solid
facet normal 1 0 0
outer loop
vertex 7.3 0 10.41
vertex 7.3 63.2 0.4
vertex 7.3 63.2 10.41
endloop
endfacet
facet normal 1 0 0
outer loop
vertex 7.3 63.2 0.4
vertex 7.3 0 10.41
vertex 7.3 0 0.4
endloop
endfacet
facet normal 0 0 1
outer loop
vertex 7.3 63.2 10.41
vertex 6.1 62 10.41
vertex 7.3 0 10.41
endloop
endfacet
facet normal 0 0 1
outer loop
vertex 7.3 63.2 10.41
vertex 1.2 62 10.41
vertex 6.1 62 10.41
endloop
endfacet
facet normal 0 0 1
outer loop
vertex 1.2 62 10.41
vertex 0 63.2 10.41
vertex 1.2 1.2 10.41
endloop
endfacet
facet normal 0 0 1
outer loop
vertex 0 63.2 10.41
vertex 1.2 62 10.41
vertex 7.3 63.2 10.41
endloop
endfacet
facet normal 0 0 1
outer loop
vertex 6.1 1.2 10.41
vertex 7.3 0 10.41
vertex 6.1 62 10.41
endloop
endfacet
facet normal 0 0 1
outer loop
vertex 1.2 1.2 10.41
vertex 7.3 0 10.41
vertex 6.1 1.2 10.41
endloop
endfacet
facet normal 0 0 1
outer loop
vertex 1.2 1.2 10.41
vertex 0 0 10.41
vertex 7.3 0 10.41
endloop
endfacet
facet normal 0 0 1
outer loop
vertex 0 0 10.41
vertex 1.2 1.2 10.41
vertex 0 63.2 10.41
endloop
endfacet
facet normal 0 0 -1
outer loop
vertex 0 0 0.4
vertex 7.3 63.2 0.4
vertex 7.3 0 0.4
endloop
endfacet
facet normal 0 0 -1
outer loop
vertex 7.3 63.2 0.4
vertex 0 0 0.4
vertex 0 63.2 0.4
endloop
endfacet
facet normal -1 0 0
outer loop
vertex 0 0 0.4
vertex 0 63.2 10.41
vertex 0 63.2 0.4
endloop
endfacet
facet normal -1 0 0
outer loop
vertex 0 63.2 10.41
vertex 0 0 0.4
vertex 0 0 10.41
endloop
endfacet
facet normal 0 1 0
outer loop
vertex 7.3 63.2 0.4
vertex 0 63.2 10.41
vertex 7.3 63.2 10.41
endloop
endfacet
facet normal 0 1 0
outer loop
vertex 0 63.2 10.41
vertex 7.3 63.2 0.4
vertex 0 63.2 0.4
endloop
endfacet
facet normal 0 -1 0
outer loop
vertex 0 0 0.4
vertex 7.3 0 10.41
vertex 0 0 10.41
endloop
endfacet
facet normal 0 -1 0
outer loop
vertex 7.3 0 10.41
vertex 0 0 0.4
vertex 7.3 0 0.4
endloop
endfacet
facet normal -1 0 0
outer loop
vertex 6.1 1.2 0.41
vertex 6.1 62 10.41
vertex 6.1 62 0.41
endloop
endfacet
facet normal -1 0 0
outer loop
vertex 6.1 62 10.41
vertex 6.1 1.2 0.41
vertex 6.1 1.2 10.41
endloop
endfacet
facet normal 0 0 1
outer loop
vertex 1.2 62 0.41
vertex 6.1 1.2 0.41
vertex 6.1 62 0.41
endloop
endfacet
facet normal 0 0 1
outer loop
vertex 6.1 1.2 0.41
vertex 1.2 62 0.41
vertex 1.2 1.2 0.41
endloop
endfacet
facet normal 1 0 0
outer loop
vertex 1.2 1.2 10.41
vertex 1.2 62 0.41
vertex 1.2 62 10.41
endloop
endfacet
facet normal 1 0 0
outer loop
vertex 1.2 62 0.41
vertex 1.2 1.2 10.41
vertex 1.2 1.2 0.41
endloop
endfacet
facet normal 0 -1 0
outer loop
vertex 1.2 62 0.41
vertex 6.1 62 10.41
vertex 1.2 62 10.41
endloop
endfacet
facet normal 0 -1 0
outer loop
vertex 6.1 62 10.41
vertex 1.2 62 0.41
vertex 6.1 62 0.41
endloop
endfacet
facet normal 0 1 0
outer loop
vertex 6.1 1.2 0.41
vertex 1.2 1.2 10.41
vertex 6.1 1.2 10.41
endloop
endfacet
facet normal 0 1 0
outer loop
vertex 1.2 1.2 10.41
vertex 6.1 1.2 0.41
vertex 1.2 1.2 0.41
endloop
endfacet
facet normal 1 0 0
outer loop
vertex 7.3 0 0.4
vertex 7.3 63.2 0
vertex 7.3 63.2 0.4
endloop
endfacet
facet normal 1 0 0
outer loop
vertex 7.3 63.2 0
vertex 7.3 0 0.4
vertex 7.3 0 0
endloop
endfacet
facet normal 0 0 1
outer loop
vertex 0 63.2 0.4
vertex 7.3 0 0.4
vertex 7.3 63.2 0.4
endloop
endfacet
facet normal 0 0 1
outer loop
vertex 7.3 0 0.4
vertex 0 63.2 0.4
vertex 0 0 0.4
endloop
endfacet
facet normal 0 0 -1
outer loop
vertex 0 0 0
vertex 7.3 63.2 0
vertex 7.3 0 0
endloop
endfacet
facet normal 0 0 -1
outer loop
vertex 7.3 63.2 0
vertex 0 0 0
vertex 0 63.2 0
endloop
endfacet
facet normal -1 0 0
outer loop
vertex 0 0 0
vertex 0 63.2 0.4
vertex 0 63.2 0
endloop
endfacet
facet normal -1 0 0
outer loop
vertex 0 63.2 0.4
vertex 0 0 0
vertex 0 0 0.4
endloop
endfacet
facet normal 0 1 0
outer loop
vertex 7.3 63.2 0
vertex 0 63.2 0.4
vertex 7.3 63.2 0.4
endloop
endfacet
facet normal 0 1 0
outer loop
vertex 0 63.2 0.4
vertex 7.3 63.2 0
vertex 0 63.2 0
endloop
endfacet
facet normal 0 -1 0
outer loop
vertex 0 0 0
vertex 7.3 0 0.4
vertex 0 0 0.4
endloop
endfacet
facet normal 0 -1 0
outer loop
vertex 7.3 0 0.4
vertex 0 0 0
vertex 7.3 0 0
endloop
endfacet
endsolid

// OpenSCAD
// file: ../../Base/Rotation.scad
// Fischertechnik Box Foundation
// Geometry Helpers Rotation

include <PlacementOptions.scad>

// getRotatedSpace(space, rotation=NoRotation)
// Rotates the space dependent on the specified rotation

function getRotatedSpace(space, rotation=NoRotation) = [
    (rotation == Rotate90 || rotation == Rotate270) ? space.y : space.x,
    (rotation == Rotate90 || rotation == Rotate270) ? space.x : space.y
];

// Rotates the given space around the fixed left lower corner
// space = the space the children needs as width/depth list [width,depth]
// rotation = 0 Rotate0 degrees, 1 Rotate90 degrees, 2 Rotate180 degrees, 3 Rotate270 degrees (equivalent to -90)

module RotateFix(space, rotation=NoRotation) {
    dy = (rotation == Rotate0 || rotation == Rotate270) ? 0 :
        (rotation == Rotate90) ? space.x :
        space.y;
    dx = (rotation < Rotate180) ? 0 :
        (rotation == Rotate180) ? space.x :
        space.y;
    
    translate([dx, dy, 0])
        rotate([0, 0, rotations[rotation]])
            children();
}
// file: ../../Base/Alignment.scad
// Fischertechnik Box Foundation
// Geometry Helpers Alignment

include <PlacementOptions.scad>

// getAlignedX(elementWidth, spaceWidth, align=AlignRight, offset=0)
// Gets the aligned X offset of an element with the given
// width in the given space.
// elementWidth = The width of the element to positon
// spaceWidth = The space where the element should be aligned
// align = 0 AlignLeft, 1 AlignCenter, 2 AlignRight
// offset = an optional offset from the aligned position. When
// aligned left or centered, then positive values are in X direction.
// When aligned right then positive values are in negative X direction.

function getAlignedX(elementWidth, spaceWidth, align=AlignRight, offset=0) =
    (align == AlignLeft) ?
        offset :
        ((align == AlignCenter) ?
        (spaceWidth - elementWidth)/2 + offset :
        spaceWidth - offset - elementWidth);

// getAlignedY(elementDepth, spaceDepth, align=AlignTop, offset=0)
// Gets the aligned Y offset of an element with the given
// depth in the given space.
// elementDepth = The depth of the element to positon
// spaceDepth = The space where the element should be aligned
// align = 0 AlignBottom, 1 AlignCenter, 2 AlignTop
// offset = an optional offset from the aligned position. When
// aligned bottom or centered, then positive values are in Y direction.
// When aligned top then positive values are in negative Y direction.

function getAlignedY(elementDepth, spaceDepth, align=AlignTop, offset=0) =
    (align == AlignBottom) ?
        offset :
        ((align == AlignCenter) ?
        (spaceDepth - elementDepth)/2 + offset :
        spaceDepth - offset - elementDepth);
// file: ../../Base/Boxes.scad
// Fischertechnik Box Foundation
// Pre-designed Boxes

use <Constants.scad>

include <PlacementOptions.scad>

box190Width = 190;
box190Depth = 130;
box130Width = 130;
box130Depth = 95;

// Values are from an original ec3 box
topBottomDifference = 1.5;
outerHeight = 40;
innerHeight = 38.2;
baseThickness = outerHeight - innerHeight;
stackExcess = 5.7;
radius = 3.5;
wallThickness = 1.5;
tolerance = 0.2;
stackOffset = innerHeight - stackExcess;

boxUsageHeight = stackOffset;
boxWallThickness = wallThickness;
boxBaseThickness = baseThickness;
boxWebWidth = 3.0;

// getBoxWallThickness()
// Gets the wall thickness of a Fischertechnik Box
function getBoxWallThickness() = boxWallThickness;

// getBoxUsageHeight()
// Gets the usable height of a Fischertechnik box
function getBoxUsageHeight() = boxUsageHeight;

// getBoxInnerHeight()
// Gets the inner height of a Fischertechnik box, including the stack excess
function getBoxInnerHeight() = innerHeight;

// getBoxBaseThickness()
// Gets the thickness of the Fischertechnik box base.
function getBoxBaseThickness() = boxBaseThickness;

// getBoxWebWidth()
// Gets the width of a box web
function getBoxWebWidth() = boxWebWidth;

// getBox190Space()
// Gets the usable inner space of a Box 190 as an x/y-list
function getBox190Space() = [
    box190Width - 2*getBoxWallThickness() - topBottomDifference, 
    box190Depth - 2*getBoxWallThickness() - topBottomDifference ];

// BoxBase(width, depth)
// Creates an empty stackable Fischertechnik compatible box
// width = Outer width of the box (190, 130, ...)
// depth = Outer depth of the box (130, 95, ...)

module BoxBase(width, depth, height=outerHeight) {    
    thinPlate = 0.01;

    innerHeight = height - baseThickness;    
    
    module BodyPlate(width, depth) {
        translate([radius, radius])
        hull() {
            w = width-2*radius;
            d = depth-2*radius;
            cube([w, d, thinPlate]);
            cylinder(thinPlate, r=radius, $fn=getFragments());
            translate([w, 0])
                cylinder(thinPlate, r=radius, $fn=getFragments());
            translate([w, d])
                cylinder(thinPlate, r=radius, $fn=getFragments());
            translate([0, d])
                cylinder(thinPlate, r=radius, $fn=getFragments());
        }
    }
    
    module Body(tolerance=tolerance) {
        hull() {
            // Bottom with tolerance to fit into the original boxes when stacked
            translate([-wallThickness+tolerance, -wallThickness+tolerance, -baseThickness])
                BodyPlate(width-topBottomDifference-2*tolerance, depth-topBottomDifference-2*tolerance);
            
            // Top
            translate([-wallThickness-topBottomDifference/2, -wallThickness-topBottomDifference/2, innerHeight-thinPlate])
                BodyPlate(width, depth);
         }
    }

    module Cutoff() {
        hull() {
            coWidth = width - 2*wallThickness;
            coDepth = depth - 2*wallThickness;
            
            // Bottom
            BodyPlate(coWidth-topBottomDifference, coDepth-topBottomDifference);

            // Top
            translate([-topBottomDifference/2, -topBottomDifference/2, innerHeight+thinPlate]) 
                BodyPlate(coWidth, coDepth);
        }
    }
    
    difference() {        
        Body();
        Cutoff();
        stackOffset = innerHeight - stackExcess;
        translate([0, 0, stackOffset + baseThickness])
            Body(tolerance=0);
    }
}

// Creates the Fischertechnik empty box 130x190 mm and places it at position 0,0
// 190x130 are the outer sizes, the inner space is slightly smaller. Use getBox190Space() to get the inner sizes.
// The box is positioned that the usable inner space is at the 0,0,0 position. The

module Box190() {
    BoxBase(box190Width, box190Depth);
}

// Gets the usable inner space of a Box 130 as an x/y-list
function getBox130Space() = [
    box130Width - 2*getBoxWallThickness() - topBottomDifference, 
    box130Depth - 2*getBoxWallThickness() - topBottomDifference ];

// Creates the Fischertechnik empty box 95x130 mm and places it at position 0,0
// 190x130 are the outer sizes, the inner space is slightly smaller. Use getBox190Space() to get the inner sizes.
// The box is positioned that the usable inner space is at the 0,0,0 position. The

module Box130() {
    BoxBase(box130Width, box130Depth);
}

// Creates a web at the specified box walls
// corner 0 = LowerLeft, 1 = UpperLeft, 2 = UpperRight, 3 = LowerRight
// side 0 = LeftOfCorner, 1 = RightOfCorner
// distance = Distance in mm from the corner
// boxSpace = inner width and depth of the box (default: Box 190)
// webWidth = length of the web (default is 3 mms)
// webThickness = thickness of the web (default is 1 mm)

module BoxWeb(corner, side, distance, boxSpace=getBox190Space(), webWidth=getBoxWebWidth(), webThickness=1.0) {
    sink = getBoxWallThickness()/2;

    width = (corner % 2 == 0) ? 
            (side == LeftOfCorner ? webWidth : webThickness) :
            (side == LeftOfCorner ? webThickness : webWidth);

    depth = (corner % 2 == 0) ? 
            (side == RightOfCorner ? webWidth : webThickness) :
            (side == RightOfCorner ? webThickness : webWidth);
    
    xDiff = corner == LowerLeft ? 
                (side == LeftOfCorner ? -sink : distance) :
            (corner == UpperLeft ?                
                (side == LeftOfCorner ? distance : -sink) :
            (corner == UpperRight ?
                (side == LeftOfCorner ? boxSpace.x-webWidth+sink : boxSpace.x-distance-webThickness) :
                (side == LeftOfCorner ? boxSpace.x-distance-webThickness: boxSpace.x-webWidth+sink)));

    yDiff = corner == LowerLeft ? 
                (side == RightOfCorner ? -sink : distance) :
            (corner == UpperLeft ?
                (side == RightOfCorner ? boxSpace.y-distance : boxSpace.y-webWidth+sink) :
            (corner == UpperRight ?
                (side == RightOfCorner ? boxSpace.y-webWidth+sink : boxSpace.y-distance) :
                (side == RightOfCorner ? distance : -sink)));
    
    translate([xDiff, yDiff, -getExcess()])
        cube([width, depth, boxUsageHeight + 2*getExcess()]);
}
// file: ../../Base/PlacementOptions.scad
// Fischertechnik Box Foundation
// Placement Options

// Alignment
NoAlign = 0;
AlignLeft = 1;
AlignBottom = 2;
AlignCenter = 3;
AlignRight = 4;
AlignTop = 5;

// Element rotation degree steps
rotations = [0, -90, -180, -270];

// Rotation
NoRotation = 0;
Rotate0 = 0;
Rotate90 = 1;
Rotate180 = 2;
Rotate270 = 3;

// Docking (seen from above)
NoDock = -1;
DockLeft = 0;
DockTop = 1;
DockRight = 2;
DockCorner = 2;
DockBottom = 3;

// Web corners
LowerLeft = 0;
UpperLeft = 1;
UpperRight = 2;
LowerRight = 3;

// Web position relative to corner
LeftOfCorner = 0;
RightOfCorner = 1;
// file: ../../Base/Placement.scad
// Fischertechnik Box Foundation
// Geometry Helpers Placement

use <Constants.scad>
use <Alignment.scad>
use <Rotation.scad>
use <Boxes.scad>

include <PlacementOptions.scad>

// Place(x=0, y=0, elementSpace=[0,0], alignX=AlignLeft, alignY=AlignBottom, rotation=Rotate0, boxSpace=getBox190Space())
// Places the child at the specified position
// y = Y-Position. This is a relative position when an X aligment is specified.
// x = X-Position. This is a relative position when an Y aligment is specified.
// elementSpace = space of the element to be placed [x,y]
// alignX = -1=NoAlign, 0 AlignLeft, 1 AlignCenter, 3 AlignRight (elementSpace and boxSpace required!)
// alignY = -1=NoAlign, 2 AlignBottom, 1 AlignCenter, 4 AlignTop (elementSpace and boxSpace required!)
// rotation = 0 Rotate0 0 degrees, 1 Rotate90 90 degrees, 
// 2 Rotate180 180 degrees, 3 Rotate270 270 degrees (equivalent to -90)
// boxSpace = Inner space of the box where the placement occurs [x,y] - default is Box 190x130 inner space

module Place(x=0, y=0, elementSpace=[0,0], 
  alignX=AlignLeft, alignY=AlignBottom, 
  rotation=NoRotation, boxSpace=getBox190Space()) {

    module Position(x, y, space, rotation=Rotate0) {
        translate([x, y, 0])
            RotateFix(space, rotation)
                children();
    }

    space = getRotatedSpace(elementSpace, rotation);
    alignedX = getAlignedX(space.x, boxSpace.x, alignX, x);
    alignedY = getAlignedY(space.y, boxSpace.y, alignY, y);
    Position(alignedX, alignedY, elementSpace, rotation)
        children();
}

// Center(space=getBox130Space(), elementSpace=[0,0])
// space = Space where the children is centered. For cylinder use centered=true and no elementSpace.
// elementSpace = space of the element to be centered [x,y]

module Center(space=getBox190Space(), elementSpace=[0,0]) {
    Place(elementSpace=elementSpace, boxSpace=space, alignX=AlignCenter, alignY=AlignCenter)
        children();
}

// CenterHorizontal(width=0, y=0, offset=0, space=getBox130Space())
// width = Width of the element to be placed.
// y = Y position of the element
// offset = Offset from the center position (negative will be left of the center)
// space = Space where the element is placed

module CenterHorizontal(width=0, y=0, offset=0, space=getBox190Space()) {
    Place(x=offset, y=y, elementSpace=[width, 0], boxSpace=space, alignX=AlignCenter)
        children(0);
}

// CenterVertical(depth=0, x=0, offset=0, space=getBox130Space())
// depth = Depth of the element to be placed.
// x = X position of the element
// offset = Offset from the center position (negative will be down of the center)
// space = Space where the element is placed

module CenterVertical(depth=0, x=0, offset=0, space=getBox190Space()) {
    Place(x=x, y=offset, elementSpace=[0, depth], boxSpace=space, alignY=AlignCenter)
        children(0);
}

// getIsVertical(align)
// True if the specified alignment needs a vertical orientation for a divider (AlignRight, AlignLeft)

function getIsVertical(align) = (align == AlignRight || align == AlignLeft);

// getIsHorizontal(align)
// True if the specified alignment needs a horizontal orientation for a divider (AlignTop, AlignBottom)

function getIsHorizontal(align) = (align == AlignTop || align == AlignBottom);
// file: ../../Elements/AxisClip10.scad
// Fischertechnik Box Library
// Axis for clip 10
// 31023

use <../ModelBase/Simple.scad>
use <../Base/Constants.scad>

width = 12;
depth = 12;
height = 23;
upperDiameter = 3.6;
clipHeight = 10;

// getAxisClip10Space()
// Gets the space of a frame for a clip 10 with spring ring (mot2)

function getAxisClip10Space() = [width, depth, height];

// AxisClip10(height, clipHeight)
// Axis for clip 10 with spring ring (mot2)
// height = Height of the complete axis
// clipHeight = Height of the rt for the clip (standard is 10, in mot3 its only 7)

module AxisClip10(height=height, clipHeight=clipHeight) {
    LeveledAxisWithSpace(height, height-clipHeight, getAxisClip10Space(), diameter=upperDiameter);
}

// Tests
color("lightgray")
AxisClip10();
// file: ../../Base/Constants.scad
// Fischertechnik Box Foundation
// Constants

// Constant values necessary for multiple elements

// Base constants
dividerThickness = 1.2;
excess = 0.01;
fragments = 90;
tolerance = 0.8;

// Gets the thickness of a divider 
function getDividerThickness() = dividerThickness;

// Gets the excess that is used to merge walls into each other
function getExcess() = excess;

// Gets amount of fragments of a cylinder
function getFragments() = fragments;

// Gets the inner tolerance of a frame to each side
function getTolerance() = tolerance;


// Fischertechnik specific constants
axisDiameter = 4;
axisBottomDiameter = axisDiameter + 1;
standardEdgeDistance = 2.5;
standardWebDistance = 11.5;
standardCornerLength = 15;
tubeWallFactor = 0.8;
smallPartsFrameHeight = 20;

// Gets axis diameter
function getAxisDiameter() = axisDiameter;

// Gets axis bottom diameter for thicker part at the bottom
function getAxisBottomDiameter() = axisBottomDiameter;

// gets the standard distance to the wall of the box for dockable frames with webs
function getStandardEdgeDistance() = standardEdgeDistance;

// gets the standard distance of each web to the corner of the dockable frame
function getStandardWebDistance() = standardWebDistance;

// gets the standard length of the corner walls of a dockable frame
function getStandardCornerLength() = standardCornerLength;

// gets the wall thickness of a tube.
function getTubeWallThickness() = tubeWallFactor * getDividerThickness();

// gets the frame height for docked small parts boxes.
function getSmallPartsFrameHeight() = smallPartsFrameHeight;
// file: ../../Elements/FrameFlatPiece60.scad
// Fischertechnik Box Library
// Frame for Flat Pieces 60
// 31555

use <../ModelBase/Complex.scad>

size = 60;

// getFrameFlatPiece60Space(count)
// count = count of pieces in X direction
// Gets the space for a frame for flat pieces 60.

function getFrameFlatPiece60Space(count=1) = getFrameFlatPieceVolume(count, size);

// FrameFlatPiece30(count)
// count = Count of flat pieces 60 in X direction

module FrameFlatPiece60(count=1) {  
    FrameFlatPiece(count, size);
}

// Tests
color("lightgray") {
FrameFlatPiece60();
}
// file: ../TestPrint.scad
// 3D Print Test Base

use <../Base/Constants.scad>

use <../Elements/AxisClip10.scad>

module TestPrint(elementSpace) {
    cube([elementSpace.x, elementSpace.y, 0.4]);
    translate([0,0,0.4+getExcess()]) {
        children();
    }
}

TestPrint(getAxisClip10Space())
    AxisClip10();
// main file
// 3D Print Test
// FrameFlatPiece60

use <../TestPrint.scad>
use <../../Elements/FrameFlatPiece60.scad>

TestPrint(getFrameFlatPiece60Space())
    FrameFlatPiece60();
